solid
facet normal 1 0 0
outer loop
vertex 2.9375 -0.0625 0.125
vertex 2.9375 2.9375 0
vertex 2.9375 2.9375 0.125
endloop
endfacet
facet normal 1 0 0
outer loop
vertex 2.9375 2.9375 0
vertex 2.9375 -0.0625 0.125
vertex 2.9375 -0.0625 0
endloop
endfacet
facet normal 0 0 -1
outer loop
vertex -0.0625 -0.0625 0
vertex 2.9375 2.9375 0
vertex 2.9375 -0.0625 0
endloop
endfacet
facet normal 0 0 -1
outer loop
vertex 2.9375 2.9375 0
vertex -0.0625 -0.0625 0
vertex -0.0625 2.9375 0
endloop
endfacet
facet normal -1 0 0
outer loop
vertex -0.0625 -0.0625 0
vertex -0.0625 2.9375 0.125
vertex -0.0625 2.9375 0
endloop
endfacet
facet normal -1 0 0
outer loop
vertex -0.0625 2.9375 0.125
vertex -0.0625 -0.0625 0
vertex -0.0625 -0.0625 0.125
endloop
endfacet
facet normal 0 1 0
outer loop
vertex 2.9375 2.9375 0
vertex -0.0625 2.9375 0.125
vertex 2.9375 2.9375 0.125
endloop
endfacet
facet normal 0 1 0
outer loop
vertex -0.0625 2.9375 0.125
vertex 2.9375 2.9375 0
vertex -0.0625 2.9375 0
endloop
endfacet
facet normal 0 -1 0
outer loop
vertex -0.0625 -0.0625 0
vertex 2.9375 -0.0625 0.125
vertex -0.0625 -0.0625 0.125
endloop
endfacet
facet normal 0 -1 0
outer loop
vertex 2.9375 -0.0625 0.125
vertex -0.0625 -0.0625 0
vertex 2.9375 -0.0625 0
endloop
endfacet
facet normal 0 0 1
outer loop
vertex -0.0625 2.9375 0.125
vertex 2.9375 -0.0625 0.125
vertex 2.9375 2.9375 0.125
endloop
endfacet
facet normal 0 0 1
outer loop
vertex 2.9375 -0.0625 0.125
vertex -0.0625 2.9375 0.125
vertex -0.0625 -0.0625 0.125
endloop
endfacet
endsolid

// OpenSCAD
// file: sub_water_base_plate.scad
// sub_water_base_plate.scad — base plate for the "water" tile family
// (element55 straight, future right-turn/left-turn variants)
// Units: inches
//
// Unlike sub_base_plate.scad's single darkgray plate, this family stacks the
// top pattern_h-plus a bit into three visible layers, bottom to top:
//   darkgray          — 1/2 plate_h  (structural base)
//   background_color  — 1/4 plate_h  (caller-defined)
//   transparent_color — 1/4 plate_h  (caller-defined, spans the outer
//                                      footprint — frame included — so it
//                                      caps the border too)
// Rivets run through darkgray + background_color only (3/4 plate_h) — the
// transparent_color cap sits over them uncut. frame_with_id() is built to
// that same 3/4 plate_h, so its top 1/4 is covered by the transparent cap
// exactly like the inner plate. The arrow (sub_water_arrows.scad) is
// unaffected — it still lives in its own top pattern_h slice, which happens
// to be the same pattern_h as the transparent_color layer at current
// dimensions, but is not derived from it.

plate_w = 2 + 7/8;
plate_d = 2 + 7/8;
plate_h = 1/8; // full plate thickness
frame_w = 1/16;
hole_d  = 3/32;
hole_r  = hole_d / 2;

pattern_h = 1/32;  // thickness of the arrow's top slice (sub_water_arrows.scad) —
                   // independent of the layer fractions below even though it
                   // currently equals plate_h/4.
id_cover = plate_h * 3 / 16;

// ── Layer heights ───────────────────────────────────────────────────────
darkgray_h    = plate_h / 2;
background_h  = plate_h / 4;
transparent_h = plate_h / 4;
frame_h       = plate_h * 3 / 4;               // = darkgray_h + background_h
rivet_depth   = darkgray_h + background_h;     // rivets stop where the transparent cap starts

module rivet_holes() {
    spacing_x = plate_w / 10;
    spacing_y = plate_d / 10;
    inset_x   = spacing_x / 2;
    inset_y   = spacing_y / 2;
    for (i = [0:9]) translate([inset_x + i * spacing_x, inset_y,           -1]) cylinder(h = rivet_depth + 2, r = hole_r, $fn = 20);
    for (i = [0:9]) translate([inset_x + i * spacing_x, plate_d - inset_y, -1]) cylinder(h = rivet_depth + 2, r = hole_r, $fn = 20);
    for (i = [0:9]) translate([inset_x,           inset_y + i * spacing_y, -1]) cylinder(h = rivet_depth + 2, r = hole_r, $fn = 20);
    for (i = [0:9]) translate([plate_w - inset_x, inset_y + i * spacing_y, -1]) cylinder(h = rivet_depth + 2, r = hole_r, $fn = 20);
}

module rivets() {
    spacing_x = plate_w / 10;
    spacing_y = plate_d / 10;
    inset_x   = spacing_x / 2;
    inset_y   = spacing_y / 2;
    color("lightgray") {
        for (i = [0:9]) translate([inset_x + i * spacing_x, inset_y,           0]) cylinder(h = rivet_depth, r = hole_r, $fn = 20);
        for (i = [0:9]) translate([inset_x + i * spacing_x, plate_d - inset_y, 0]) cylinder(h = rivet_depth, r = hole_r, $fn = 20);
        for (i = [0:9]) translate([inset_x,           inset_y + i * spacing_y, 0]) cylinder(h = rivet_depth, r = hole_r, $fn = 20);
        for (i = [0:9]) translate([plate_w - inset_x, inset_y + i * spacing_y, 0]) cylinder(h = rivet_depth, r = hole_r, $fn = 20);
    }
}

// Border + edge ID marks, built to frame_h (3/4 plate_h) — the transparent
// cap covers the remaining top 1/4, over the frame as well as the plate.
module frame_with_id(colors = []) {
    region_w = plate_w / 8;
    region_d = plate_d / 8;
    mark_h   = frame_h - 2 * id_cover;

    color("black")
    difference() {
        translate([-frame_w, -frame_w, 0])
            cube([plate_w + 2 * frame_w, plate_d + 2 * frame_w, frame_h]);
        translate([0, 0, -0.001])
            cube([plate_w, plate_d, frame_h + 0.002]);
        // top/bottom/left/right straight runs only — corners stay solid black
        translate([0, plate_d - 0.001, -0.001])
            cube([plate_w, frame_w + 0.002, frame_h + 0.002]);
        translate([0, -frame_w - 0.001, -0.001])
            cube([plate_w, frame_w + 0.002, frame_h + 0.002]);
        translate([-frame_w - 0.001, 0, -0.001])
            cube([frame_w + 0.002, plate_d, frame_h + 0.002]);
        translate([plate_w - 0.001, 0, -0.001])
            cube([frame_w + 0.002, plate_d, frame_h + 0.002]);
    }

    for (i = [0:7]) {
        c     = (i == 0) ? "darkgray" : (i == 7) ? "black" : ((colors[i-1] != undef) ? colors[i-1] : "black");

        // top edge — id_cover, mark, id_cover
        color("black") translate([i * region_w, plate_d, 0]) cube([region_w, frame_w, id_cover]);
        color(c)       translate([i * region_w, plate_d, id_cover]) cube([region_w, frame_w, mark_h]);
        color("black") translate([i * region_w, plate_d, id_cover + mark_h]) cube([region_w, frame_w, id_cover]);

        // bottom edge (reversed) — id_cover, mark, id_cover
        color("black") translate([(7-i) * region_w, -frame_w, 0]) cube([region_w, frame_w, id_cover]);
        color(c)       translate([(7-i) * region_w, -frame_w, id_cover]) cube([region_w, frame_w, mark_h]);
        color("black") translate([(7-i) * region_w, -frame_w, id_cover + mark_h]) cube([region_w, frame_w, id_cover]);

        // left edge — id_cover, mark, id_cover
        color("black") translate([-frame_w, i * region_d, 0]) cube([frame_w, region_d, id_cover]);
        color(c)       translate([-frame_w, i * region_d, id_cover]) cube([frame_w, region_d, mark_h]);
        color("black") translate([-frame_w, i * region_d, id_cover + mark_h]) cube([frame_w, region_d, id_cover]);

        // right edge (reversed) — id_cover, mark, id_cover
        color("black") translate([plate_w, (7-i) * region_d, 0]) cube([frame_w, region_d, id_cover]);
        color(c)       translate([plate_w, (7-i) * region_d, id_cover]) cube([frame_w, region_d, mark_h]);
        color("black") translate([plate_w, (7-i) * region_d, id_cover + mark_h]) cube([frame_w, region_d, id_cover]);
    }
}

// Frame + inner darkgray/background_color stack, with rivets running
// through both. Does not include the transparent cap — see
// plate_trans_layer().
module plate(colors = []) {
    frame_with_id(colors);
    union() {
        difference() {
            union() {
                color("darkgray")
                    cube([plate_w, plate_d, darkgray_h]);
                translate([0, 0, darkgray_h])
                color(background_color)
                    cube([plate_w, plate_d, background_h]);
            }
            rivet_holes();
        }
        rivets();
    }
}

// plate() plus the transparent_color cap — spans the full outer footprint
// (frame included) across the top transparent_h slice. plate()'s frame and
// inner stack both already stop exactly at plate_h - transparent_h, so this
// is a plain union, not a cut-and-refill.
module plate_trans_layer(colors = []) {
    plate(colors);
    if (show_transparent) {
        color(transparent_color)
        translate([-frame_w, -frame_w, plate_h - transparent_h])
            cube([plate_w + 2 * frame_w, plate_d + 2 * frame_w, transparent_h]);
    }
}   
// main file
// element55.scad — still water tile
// Units: inches

straight     = false;
left_turn    = false;
right_turn   = false;
double_speed = false;
show_transparent = true;  // if false, the transparent layer is omitted entirely — useful for
                          // debugging the underlying layers

include <sub_water_base_plate.scad>
include <sub_water_arrows.scad>

plate_colors = ["lightblue", undef, undef, undef, undef, "lightblue"];

arrow_color  = "black";
background_color = "blue";
transparent_color = "lightblue";

difference() {
    plate_trans_layer(plate_colors);
    arrow_cutout();
}
arrow();
